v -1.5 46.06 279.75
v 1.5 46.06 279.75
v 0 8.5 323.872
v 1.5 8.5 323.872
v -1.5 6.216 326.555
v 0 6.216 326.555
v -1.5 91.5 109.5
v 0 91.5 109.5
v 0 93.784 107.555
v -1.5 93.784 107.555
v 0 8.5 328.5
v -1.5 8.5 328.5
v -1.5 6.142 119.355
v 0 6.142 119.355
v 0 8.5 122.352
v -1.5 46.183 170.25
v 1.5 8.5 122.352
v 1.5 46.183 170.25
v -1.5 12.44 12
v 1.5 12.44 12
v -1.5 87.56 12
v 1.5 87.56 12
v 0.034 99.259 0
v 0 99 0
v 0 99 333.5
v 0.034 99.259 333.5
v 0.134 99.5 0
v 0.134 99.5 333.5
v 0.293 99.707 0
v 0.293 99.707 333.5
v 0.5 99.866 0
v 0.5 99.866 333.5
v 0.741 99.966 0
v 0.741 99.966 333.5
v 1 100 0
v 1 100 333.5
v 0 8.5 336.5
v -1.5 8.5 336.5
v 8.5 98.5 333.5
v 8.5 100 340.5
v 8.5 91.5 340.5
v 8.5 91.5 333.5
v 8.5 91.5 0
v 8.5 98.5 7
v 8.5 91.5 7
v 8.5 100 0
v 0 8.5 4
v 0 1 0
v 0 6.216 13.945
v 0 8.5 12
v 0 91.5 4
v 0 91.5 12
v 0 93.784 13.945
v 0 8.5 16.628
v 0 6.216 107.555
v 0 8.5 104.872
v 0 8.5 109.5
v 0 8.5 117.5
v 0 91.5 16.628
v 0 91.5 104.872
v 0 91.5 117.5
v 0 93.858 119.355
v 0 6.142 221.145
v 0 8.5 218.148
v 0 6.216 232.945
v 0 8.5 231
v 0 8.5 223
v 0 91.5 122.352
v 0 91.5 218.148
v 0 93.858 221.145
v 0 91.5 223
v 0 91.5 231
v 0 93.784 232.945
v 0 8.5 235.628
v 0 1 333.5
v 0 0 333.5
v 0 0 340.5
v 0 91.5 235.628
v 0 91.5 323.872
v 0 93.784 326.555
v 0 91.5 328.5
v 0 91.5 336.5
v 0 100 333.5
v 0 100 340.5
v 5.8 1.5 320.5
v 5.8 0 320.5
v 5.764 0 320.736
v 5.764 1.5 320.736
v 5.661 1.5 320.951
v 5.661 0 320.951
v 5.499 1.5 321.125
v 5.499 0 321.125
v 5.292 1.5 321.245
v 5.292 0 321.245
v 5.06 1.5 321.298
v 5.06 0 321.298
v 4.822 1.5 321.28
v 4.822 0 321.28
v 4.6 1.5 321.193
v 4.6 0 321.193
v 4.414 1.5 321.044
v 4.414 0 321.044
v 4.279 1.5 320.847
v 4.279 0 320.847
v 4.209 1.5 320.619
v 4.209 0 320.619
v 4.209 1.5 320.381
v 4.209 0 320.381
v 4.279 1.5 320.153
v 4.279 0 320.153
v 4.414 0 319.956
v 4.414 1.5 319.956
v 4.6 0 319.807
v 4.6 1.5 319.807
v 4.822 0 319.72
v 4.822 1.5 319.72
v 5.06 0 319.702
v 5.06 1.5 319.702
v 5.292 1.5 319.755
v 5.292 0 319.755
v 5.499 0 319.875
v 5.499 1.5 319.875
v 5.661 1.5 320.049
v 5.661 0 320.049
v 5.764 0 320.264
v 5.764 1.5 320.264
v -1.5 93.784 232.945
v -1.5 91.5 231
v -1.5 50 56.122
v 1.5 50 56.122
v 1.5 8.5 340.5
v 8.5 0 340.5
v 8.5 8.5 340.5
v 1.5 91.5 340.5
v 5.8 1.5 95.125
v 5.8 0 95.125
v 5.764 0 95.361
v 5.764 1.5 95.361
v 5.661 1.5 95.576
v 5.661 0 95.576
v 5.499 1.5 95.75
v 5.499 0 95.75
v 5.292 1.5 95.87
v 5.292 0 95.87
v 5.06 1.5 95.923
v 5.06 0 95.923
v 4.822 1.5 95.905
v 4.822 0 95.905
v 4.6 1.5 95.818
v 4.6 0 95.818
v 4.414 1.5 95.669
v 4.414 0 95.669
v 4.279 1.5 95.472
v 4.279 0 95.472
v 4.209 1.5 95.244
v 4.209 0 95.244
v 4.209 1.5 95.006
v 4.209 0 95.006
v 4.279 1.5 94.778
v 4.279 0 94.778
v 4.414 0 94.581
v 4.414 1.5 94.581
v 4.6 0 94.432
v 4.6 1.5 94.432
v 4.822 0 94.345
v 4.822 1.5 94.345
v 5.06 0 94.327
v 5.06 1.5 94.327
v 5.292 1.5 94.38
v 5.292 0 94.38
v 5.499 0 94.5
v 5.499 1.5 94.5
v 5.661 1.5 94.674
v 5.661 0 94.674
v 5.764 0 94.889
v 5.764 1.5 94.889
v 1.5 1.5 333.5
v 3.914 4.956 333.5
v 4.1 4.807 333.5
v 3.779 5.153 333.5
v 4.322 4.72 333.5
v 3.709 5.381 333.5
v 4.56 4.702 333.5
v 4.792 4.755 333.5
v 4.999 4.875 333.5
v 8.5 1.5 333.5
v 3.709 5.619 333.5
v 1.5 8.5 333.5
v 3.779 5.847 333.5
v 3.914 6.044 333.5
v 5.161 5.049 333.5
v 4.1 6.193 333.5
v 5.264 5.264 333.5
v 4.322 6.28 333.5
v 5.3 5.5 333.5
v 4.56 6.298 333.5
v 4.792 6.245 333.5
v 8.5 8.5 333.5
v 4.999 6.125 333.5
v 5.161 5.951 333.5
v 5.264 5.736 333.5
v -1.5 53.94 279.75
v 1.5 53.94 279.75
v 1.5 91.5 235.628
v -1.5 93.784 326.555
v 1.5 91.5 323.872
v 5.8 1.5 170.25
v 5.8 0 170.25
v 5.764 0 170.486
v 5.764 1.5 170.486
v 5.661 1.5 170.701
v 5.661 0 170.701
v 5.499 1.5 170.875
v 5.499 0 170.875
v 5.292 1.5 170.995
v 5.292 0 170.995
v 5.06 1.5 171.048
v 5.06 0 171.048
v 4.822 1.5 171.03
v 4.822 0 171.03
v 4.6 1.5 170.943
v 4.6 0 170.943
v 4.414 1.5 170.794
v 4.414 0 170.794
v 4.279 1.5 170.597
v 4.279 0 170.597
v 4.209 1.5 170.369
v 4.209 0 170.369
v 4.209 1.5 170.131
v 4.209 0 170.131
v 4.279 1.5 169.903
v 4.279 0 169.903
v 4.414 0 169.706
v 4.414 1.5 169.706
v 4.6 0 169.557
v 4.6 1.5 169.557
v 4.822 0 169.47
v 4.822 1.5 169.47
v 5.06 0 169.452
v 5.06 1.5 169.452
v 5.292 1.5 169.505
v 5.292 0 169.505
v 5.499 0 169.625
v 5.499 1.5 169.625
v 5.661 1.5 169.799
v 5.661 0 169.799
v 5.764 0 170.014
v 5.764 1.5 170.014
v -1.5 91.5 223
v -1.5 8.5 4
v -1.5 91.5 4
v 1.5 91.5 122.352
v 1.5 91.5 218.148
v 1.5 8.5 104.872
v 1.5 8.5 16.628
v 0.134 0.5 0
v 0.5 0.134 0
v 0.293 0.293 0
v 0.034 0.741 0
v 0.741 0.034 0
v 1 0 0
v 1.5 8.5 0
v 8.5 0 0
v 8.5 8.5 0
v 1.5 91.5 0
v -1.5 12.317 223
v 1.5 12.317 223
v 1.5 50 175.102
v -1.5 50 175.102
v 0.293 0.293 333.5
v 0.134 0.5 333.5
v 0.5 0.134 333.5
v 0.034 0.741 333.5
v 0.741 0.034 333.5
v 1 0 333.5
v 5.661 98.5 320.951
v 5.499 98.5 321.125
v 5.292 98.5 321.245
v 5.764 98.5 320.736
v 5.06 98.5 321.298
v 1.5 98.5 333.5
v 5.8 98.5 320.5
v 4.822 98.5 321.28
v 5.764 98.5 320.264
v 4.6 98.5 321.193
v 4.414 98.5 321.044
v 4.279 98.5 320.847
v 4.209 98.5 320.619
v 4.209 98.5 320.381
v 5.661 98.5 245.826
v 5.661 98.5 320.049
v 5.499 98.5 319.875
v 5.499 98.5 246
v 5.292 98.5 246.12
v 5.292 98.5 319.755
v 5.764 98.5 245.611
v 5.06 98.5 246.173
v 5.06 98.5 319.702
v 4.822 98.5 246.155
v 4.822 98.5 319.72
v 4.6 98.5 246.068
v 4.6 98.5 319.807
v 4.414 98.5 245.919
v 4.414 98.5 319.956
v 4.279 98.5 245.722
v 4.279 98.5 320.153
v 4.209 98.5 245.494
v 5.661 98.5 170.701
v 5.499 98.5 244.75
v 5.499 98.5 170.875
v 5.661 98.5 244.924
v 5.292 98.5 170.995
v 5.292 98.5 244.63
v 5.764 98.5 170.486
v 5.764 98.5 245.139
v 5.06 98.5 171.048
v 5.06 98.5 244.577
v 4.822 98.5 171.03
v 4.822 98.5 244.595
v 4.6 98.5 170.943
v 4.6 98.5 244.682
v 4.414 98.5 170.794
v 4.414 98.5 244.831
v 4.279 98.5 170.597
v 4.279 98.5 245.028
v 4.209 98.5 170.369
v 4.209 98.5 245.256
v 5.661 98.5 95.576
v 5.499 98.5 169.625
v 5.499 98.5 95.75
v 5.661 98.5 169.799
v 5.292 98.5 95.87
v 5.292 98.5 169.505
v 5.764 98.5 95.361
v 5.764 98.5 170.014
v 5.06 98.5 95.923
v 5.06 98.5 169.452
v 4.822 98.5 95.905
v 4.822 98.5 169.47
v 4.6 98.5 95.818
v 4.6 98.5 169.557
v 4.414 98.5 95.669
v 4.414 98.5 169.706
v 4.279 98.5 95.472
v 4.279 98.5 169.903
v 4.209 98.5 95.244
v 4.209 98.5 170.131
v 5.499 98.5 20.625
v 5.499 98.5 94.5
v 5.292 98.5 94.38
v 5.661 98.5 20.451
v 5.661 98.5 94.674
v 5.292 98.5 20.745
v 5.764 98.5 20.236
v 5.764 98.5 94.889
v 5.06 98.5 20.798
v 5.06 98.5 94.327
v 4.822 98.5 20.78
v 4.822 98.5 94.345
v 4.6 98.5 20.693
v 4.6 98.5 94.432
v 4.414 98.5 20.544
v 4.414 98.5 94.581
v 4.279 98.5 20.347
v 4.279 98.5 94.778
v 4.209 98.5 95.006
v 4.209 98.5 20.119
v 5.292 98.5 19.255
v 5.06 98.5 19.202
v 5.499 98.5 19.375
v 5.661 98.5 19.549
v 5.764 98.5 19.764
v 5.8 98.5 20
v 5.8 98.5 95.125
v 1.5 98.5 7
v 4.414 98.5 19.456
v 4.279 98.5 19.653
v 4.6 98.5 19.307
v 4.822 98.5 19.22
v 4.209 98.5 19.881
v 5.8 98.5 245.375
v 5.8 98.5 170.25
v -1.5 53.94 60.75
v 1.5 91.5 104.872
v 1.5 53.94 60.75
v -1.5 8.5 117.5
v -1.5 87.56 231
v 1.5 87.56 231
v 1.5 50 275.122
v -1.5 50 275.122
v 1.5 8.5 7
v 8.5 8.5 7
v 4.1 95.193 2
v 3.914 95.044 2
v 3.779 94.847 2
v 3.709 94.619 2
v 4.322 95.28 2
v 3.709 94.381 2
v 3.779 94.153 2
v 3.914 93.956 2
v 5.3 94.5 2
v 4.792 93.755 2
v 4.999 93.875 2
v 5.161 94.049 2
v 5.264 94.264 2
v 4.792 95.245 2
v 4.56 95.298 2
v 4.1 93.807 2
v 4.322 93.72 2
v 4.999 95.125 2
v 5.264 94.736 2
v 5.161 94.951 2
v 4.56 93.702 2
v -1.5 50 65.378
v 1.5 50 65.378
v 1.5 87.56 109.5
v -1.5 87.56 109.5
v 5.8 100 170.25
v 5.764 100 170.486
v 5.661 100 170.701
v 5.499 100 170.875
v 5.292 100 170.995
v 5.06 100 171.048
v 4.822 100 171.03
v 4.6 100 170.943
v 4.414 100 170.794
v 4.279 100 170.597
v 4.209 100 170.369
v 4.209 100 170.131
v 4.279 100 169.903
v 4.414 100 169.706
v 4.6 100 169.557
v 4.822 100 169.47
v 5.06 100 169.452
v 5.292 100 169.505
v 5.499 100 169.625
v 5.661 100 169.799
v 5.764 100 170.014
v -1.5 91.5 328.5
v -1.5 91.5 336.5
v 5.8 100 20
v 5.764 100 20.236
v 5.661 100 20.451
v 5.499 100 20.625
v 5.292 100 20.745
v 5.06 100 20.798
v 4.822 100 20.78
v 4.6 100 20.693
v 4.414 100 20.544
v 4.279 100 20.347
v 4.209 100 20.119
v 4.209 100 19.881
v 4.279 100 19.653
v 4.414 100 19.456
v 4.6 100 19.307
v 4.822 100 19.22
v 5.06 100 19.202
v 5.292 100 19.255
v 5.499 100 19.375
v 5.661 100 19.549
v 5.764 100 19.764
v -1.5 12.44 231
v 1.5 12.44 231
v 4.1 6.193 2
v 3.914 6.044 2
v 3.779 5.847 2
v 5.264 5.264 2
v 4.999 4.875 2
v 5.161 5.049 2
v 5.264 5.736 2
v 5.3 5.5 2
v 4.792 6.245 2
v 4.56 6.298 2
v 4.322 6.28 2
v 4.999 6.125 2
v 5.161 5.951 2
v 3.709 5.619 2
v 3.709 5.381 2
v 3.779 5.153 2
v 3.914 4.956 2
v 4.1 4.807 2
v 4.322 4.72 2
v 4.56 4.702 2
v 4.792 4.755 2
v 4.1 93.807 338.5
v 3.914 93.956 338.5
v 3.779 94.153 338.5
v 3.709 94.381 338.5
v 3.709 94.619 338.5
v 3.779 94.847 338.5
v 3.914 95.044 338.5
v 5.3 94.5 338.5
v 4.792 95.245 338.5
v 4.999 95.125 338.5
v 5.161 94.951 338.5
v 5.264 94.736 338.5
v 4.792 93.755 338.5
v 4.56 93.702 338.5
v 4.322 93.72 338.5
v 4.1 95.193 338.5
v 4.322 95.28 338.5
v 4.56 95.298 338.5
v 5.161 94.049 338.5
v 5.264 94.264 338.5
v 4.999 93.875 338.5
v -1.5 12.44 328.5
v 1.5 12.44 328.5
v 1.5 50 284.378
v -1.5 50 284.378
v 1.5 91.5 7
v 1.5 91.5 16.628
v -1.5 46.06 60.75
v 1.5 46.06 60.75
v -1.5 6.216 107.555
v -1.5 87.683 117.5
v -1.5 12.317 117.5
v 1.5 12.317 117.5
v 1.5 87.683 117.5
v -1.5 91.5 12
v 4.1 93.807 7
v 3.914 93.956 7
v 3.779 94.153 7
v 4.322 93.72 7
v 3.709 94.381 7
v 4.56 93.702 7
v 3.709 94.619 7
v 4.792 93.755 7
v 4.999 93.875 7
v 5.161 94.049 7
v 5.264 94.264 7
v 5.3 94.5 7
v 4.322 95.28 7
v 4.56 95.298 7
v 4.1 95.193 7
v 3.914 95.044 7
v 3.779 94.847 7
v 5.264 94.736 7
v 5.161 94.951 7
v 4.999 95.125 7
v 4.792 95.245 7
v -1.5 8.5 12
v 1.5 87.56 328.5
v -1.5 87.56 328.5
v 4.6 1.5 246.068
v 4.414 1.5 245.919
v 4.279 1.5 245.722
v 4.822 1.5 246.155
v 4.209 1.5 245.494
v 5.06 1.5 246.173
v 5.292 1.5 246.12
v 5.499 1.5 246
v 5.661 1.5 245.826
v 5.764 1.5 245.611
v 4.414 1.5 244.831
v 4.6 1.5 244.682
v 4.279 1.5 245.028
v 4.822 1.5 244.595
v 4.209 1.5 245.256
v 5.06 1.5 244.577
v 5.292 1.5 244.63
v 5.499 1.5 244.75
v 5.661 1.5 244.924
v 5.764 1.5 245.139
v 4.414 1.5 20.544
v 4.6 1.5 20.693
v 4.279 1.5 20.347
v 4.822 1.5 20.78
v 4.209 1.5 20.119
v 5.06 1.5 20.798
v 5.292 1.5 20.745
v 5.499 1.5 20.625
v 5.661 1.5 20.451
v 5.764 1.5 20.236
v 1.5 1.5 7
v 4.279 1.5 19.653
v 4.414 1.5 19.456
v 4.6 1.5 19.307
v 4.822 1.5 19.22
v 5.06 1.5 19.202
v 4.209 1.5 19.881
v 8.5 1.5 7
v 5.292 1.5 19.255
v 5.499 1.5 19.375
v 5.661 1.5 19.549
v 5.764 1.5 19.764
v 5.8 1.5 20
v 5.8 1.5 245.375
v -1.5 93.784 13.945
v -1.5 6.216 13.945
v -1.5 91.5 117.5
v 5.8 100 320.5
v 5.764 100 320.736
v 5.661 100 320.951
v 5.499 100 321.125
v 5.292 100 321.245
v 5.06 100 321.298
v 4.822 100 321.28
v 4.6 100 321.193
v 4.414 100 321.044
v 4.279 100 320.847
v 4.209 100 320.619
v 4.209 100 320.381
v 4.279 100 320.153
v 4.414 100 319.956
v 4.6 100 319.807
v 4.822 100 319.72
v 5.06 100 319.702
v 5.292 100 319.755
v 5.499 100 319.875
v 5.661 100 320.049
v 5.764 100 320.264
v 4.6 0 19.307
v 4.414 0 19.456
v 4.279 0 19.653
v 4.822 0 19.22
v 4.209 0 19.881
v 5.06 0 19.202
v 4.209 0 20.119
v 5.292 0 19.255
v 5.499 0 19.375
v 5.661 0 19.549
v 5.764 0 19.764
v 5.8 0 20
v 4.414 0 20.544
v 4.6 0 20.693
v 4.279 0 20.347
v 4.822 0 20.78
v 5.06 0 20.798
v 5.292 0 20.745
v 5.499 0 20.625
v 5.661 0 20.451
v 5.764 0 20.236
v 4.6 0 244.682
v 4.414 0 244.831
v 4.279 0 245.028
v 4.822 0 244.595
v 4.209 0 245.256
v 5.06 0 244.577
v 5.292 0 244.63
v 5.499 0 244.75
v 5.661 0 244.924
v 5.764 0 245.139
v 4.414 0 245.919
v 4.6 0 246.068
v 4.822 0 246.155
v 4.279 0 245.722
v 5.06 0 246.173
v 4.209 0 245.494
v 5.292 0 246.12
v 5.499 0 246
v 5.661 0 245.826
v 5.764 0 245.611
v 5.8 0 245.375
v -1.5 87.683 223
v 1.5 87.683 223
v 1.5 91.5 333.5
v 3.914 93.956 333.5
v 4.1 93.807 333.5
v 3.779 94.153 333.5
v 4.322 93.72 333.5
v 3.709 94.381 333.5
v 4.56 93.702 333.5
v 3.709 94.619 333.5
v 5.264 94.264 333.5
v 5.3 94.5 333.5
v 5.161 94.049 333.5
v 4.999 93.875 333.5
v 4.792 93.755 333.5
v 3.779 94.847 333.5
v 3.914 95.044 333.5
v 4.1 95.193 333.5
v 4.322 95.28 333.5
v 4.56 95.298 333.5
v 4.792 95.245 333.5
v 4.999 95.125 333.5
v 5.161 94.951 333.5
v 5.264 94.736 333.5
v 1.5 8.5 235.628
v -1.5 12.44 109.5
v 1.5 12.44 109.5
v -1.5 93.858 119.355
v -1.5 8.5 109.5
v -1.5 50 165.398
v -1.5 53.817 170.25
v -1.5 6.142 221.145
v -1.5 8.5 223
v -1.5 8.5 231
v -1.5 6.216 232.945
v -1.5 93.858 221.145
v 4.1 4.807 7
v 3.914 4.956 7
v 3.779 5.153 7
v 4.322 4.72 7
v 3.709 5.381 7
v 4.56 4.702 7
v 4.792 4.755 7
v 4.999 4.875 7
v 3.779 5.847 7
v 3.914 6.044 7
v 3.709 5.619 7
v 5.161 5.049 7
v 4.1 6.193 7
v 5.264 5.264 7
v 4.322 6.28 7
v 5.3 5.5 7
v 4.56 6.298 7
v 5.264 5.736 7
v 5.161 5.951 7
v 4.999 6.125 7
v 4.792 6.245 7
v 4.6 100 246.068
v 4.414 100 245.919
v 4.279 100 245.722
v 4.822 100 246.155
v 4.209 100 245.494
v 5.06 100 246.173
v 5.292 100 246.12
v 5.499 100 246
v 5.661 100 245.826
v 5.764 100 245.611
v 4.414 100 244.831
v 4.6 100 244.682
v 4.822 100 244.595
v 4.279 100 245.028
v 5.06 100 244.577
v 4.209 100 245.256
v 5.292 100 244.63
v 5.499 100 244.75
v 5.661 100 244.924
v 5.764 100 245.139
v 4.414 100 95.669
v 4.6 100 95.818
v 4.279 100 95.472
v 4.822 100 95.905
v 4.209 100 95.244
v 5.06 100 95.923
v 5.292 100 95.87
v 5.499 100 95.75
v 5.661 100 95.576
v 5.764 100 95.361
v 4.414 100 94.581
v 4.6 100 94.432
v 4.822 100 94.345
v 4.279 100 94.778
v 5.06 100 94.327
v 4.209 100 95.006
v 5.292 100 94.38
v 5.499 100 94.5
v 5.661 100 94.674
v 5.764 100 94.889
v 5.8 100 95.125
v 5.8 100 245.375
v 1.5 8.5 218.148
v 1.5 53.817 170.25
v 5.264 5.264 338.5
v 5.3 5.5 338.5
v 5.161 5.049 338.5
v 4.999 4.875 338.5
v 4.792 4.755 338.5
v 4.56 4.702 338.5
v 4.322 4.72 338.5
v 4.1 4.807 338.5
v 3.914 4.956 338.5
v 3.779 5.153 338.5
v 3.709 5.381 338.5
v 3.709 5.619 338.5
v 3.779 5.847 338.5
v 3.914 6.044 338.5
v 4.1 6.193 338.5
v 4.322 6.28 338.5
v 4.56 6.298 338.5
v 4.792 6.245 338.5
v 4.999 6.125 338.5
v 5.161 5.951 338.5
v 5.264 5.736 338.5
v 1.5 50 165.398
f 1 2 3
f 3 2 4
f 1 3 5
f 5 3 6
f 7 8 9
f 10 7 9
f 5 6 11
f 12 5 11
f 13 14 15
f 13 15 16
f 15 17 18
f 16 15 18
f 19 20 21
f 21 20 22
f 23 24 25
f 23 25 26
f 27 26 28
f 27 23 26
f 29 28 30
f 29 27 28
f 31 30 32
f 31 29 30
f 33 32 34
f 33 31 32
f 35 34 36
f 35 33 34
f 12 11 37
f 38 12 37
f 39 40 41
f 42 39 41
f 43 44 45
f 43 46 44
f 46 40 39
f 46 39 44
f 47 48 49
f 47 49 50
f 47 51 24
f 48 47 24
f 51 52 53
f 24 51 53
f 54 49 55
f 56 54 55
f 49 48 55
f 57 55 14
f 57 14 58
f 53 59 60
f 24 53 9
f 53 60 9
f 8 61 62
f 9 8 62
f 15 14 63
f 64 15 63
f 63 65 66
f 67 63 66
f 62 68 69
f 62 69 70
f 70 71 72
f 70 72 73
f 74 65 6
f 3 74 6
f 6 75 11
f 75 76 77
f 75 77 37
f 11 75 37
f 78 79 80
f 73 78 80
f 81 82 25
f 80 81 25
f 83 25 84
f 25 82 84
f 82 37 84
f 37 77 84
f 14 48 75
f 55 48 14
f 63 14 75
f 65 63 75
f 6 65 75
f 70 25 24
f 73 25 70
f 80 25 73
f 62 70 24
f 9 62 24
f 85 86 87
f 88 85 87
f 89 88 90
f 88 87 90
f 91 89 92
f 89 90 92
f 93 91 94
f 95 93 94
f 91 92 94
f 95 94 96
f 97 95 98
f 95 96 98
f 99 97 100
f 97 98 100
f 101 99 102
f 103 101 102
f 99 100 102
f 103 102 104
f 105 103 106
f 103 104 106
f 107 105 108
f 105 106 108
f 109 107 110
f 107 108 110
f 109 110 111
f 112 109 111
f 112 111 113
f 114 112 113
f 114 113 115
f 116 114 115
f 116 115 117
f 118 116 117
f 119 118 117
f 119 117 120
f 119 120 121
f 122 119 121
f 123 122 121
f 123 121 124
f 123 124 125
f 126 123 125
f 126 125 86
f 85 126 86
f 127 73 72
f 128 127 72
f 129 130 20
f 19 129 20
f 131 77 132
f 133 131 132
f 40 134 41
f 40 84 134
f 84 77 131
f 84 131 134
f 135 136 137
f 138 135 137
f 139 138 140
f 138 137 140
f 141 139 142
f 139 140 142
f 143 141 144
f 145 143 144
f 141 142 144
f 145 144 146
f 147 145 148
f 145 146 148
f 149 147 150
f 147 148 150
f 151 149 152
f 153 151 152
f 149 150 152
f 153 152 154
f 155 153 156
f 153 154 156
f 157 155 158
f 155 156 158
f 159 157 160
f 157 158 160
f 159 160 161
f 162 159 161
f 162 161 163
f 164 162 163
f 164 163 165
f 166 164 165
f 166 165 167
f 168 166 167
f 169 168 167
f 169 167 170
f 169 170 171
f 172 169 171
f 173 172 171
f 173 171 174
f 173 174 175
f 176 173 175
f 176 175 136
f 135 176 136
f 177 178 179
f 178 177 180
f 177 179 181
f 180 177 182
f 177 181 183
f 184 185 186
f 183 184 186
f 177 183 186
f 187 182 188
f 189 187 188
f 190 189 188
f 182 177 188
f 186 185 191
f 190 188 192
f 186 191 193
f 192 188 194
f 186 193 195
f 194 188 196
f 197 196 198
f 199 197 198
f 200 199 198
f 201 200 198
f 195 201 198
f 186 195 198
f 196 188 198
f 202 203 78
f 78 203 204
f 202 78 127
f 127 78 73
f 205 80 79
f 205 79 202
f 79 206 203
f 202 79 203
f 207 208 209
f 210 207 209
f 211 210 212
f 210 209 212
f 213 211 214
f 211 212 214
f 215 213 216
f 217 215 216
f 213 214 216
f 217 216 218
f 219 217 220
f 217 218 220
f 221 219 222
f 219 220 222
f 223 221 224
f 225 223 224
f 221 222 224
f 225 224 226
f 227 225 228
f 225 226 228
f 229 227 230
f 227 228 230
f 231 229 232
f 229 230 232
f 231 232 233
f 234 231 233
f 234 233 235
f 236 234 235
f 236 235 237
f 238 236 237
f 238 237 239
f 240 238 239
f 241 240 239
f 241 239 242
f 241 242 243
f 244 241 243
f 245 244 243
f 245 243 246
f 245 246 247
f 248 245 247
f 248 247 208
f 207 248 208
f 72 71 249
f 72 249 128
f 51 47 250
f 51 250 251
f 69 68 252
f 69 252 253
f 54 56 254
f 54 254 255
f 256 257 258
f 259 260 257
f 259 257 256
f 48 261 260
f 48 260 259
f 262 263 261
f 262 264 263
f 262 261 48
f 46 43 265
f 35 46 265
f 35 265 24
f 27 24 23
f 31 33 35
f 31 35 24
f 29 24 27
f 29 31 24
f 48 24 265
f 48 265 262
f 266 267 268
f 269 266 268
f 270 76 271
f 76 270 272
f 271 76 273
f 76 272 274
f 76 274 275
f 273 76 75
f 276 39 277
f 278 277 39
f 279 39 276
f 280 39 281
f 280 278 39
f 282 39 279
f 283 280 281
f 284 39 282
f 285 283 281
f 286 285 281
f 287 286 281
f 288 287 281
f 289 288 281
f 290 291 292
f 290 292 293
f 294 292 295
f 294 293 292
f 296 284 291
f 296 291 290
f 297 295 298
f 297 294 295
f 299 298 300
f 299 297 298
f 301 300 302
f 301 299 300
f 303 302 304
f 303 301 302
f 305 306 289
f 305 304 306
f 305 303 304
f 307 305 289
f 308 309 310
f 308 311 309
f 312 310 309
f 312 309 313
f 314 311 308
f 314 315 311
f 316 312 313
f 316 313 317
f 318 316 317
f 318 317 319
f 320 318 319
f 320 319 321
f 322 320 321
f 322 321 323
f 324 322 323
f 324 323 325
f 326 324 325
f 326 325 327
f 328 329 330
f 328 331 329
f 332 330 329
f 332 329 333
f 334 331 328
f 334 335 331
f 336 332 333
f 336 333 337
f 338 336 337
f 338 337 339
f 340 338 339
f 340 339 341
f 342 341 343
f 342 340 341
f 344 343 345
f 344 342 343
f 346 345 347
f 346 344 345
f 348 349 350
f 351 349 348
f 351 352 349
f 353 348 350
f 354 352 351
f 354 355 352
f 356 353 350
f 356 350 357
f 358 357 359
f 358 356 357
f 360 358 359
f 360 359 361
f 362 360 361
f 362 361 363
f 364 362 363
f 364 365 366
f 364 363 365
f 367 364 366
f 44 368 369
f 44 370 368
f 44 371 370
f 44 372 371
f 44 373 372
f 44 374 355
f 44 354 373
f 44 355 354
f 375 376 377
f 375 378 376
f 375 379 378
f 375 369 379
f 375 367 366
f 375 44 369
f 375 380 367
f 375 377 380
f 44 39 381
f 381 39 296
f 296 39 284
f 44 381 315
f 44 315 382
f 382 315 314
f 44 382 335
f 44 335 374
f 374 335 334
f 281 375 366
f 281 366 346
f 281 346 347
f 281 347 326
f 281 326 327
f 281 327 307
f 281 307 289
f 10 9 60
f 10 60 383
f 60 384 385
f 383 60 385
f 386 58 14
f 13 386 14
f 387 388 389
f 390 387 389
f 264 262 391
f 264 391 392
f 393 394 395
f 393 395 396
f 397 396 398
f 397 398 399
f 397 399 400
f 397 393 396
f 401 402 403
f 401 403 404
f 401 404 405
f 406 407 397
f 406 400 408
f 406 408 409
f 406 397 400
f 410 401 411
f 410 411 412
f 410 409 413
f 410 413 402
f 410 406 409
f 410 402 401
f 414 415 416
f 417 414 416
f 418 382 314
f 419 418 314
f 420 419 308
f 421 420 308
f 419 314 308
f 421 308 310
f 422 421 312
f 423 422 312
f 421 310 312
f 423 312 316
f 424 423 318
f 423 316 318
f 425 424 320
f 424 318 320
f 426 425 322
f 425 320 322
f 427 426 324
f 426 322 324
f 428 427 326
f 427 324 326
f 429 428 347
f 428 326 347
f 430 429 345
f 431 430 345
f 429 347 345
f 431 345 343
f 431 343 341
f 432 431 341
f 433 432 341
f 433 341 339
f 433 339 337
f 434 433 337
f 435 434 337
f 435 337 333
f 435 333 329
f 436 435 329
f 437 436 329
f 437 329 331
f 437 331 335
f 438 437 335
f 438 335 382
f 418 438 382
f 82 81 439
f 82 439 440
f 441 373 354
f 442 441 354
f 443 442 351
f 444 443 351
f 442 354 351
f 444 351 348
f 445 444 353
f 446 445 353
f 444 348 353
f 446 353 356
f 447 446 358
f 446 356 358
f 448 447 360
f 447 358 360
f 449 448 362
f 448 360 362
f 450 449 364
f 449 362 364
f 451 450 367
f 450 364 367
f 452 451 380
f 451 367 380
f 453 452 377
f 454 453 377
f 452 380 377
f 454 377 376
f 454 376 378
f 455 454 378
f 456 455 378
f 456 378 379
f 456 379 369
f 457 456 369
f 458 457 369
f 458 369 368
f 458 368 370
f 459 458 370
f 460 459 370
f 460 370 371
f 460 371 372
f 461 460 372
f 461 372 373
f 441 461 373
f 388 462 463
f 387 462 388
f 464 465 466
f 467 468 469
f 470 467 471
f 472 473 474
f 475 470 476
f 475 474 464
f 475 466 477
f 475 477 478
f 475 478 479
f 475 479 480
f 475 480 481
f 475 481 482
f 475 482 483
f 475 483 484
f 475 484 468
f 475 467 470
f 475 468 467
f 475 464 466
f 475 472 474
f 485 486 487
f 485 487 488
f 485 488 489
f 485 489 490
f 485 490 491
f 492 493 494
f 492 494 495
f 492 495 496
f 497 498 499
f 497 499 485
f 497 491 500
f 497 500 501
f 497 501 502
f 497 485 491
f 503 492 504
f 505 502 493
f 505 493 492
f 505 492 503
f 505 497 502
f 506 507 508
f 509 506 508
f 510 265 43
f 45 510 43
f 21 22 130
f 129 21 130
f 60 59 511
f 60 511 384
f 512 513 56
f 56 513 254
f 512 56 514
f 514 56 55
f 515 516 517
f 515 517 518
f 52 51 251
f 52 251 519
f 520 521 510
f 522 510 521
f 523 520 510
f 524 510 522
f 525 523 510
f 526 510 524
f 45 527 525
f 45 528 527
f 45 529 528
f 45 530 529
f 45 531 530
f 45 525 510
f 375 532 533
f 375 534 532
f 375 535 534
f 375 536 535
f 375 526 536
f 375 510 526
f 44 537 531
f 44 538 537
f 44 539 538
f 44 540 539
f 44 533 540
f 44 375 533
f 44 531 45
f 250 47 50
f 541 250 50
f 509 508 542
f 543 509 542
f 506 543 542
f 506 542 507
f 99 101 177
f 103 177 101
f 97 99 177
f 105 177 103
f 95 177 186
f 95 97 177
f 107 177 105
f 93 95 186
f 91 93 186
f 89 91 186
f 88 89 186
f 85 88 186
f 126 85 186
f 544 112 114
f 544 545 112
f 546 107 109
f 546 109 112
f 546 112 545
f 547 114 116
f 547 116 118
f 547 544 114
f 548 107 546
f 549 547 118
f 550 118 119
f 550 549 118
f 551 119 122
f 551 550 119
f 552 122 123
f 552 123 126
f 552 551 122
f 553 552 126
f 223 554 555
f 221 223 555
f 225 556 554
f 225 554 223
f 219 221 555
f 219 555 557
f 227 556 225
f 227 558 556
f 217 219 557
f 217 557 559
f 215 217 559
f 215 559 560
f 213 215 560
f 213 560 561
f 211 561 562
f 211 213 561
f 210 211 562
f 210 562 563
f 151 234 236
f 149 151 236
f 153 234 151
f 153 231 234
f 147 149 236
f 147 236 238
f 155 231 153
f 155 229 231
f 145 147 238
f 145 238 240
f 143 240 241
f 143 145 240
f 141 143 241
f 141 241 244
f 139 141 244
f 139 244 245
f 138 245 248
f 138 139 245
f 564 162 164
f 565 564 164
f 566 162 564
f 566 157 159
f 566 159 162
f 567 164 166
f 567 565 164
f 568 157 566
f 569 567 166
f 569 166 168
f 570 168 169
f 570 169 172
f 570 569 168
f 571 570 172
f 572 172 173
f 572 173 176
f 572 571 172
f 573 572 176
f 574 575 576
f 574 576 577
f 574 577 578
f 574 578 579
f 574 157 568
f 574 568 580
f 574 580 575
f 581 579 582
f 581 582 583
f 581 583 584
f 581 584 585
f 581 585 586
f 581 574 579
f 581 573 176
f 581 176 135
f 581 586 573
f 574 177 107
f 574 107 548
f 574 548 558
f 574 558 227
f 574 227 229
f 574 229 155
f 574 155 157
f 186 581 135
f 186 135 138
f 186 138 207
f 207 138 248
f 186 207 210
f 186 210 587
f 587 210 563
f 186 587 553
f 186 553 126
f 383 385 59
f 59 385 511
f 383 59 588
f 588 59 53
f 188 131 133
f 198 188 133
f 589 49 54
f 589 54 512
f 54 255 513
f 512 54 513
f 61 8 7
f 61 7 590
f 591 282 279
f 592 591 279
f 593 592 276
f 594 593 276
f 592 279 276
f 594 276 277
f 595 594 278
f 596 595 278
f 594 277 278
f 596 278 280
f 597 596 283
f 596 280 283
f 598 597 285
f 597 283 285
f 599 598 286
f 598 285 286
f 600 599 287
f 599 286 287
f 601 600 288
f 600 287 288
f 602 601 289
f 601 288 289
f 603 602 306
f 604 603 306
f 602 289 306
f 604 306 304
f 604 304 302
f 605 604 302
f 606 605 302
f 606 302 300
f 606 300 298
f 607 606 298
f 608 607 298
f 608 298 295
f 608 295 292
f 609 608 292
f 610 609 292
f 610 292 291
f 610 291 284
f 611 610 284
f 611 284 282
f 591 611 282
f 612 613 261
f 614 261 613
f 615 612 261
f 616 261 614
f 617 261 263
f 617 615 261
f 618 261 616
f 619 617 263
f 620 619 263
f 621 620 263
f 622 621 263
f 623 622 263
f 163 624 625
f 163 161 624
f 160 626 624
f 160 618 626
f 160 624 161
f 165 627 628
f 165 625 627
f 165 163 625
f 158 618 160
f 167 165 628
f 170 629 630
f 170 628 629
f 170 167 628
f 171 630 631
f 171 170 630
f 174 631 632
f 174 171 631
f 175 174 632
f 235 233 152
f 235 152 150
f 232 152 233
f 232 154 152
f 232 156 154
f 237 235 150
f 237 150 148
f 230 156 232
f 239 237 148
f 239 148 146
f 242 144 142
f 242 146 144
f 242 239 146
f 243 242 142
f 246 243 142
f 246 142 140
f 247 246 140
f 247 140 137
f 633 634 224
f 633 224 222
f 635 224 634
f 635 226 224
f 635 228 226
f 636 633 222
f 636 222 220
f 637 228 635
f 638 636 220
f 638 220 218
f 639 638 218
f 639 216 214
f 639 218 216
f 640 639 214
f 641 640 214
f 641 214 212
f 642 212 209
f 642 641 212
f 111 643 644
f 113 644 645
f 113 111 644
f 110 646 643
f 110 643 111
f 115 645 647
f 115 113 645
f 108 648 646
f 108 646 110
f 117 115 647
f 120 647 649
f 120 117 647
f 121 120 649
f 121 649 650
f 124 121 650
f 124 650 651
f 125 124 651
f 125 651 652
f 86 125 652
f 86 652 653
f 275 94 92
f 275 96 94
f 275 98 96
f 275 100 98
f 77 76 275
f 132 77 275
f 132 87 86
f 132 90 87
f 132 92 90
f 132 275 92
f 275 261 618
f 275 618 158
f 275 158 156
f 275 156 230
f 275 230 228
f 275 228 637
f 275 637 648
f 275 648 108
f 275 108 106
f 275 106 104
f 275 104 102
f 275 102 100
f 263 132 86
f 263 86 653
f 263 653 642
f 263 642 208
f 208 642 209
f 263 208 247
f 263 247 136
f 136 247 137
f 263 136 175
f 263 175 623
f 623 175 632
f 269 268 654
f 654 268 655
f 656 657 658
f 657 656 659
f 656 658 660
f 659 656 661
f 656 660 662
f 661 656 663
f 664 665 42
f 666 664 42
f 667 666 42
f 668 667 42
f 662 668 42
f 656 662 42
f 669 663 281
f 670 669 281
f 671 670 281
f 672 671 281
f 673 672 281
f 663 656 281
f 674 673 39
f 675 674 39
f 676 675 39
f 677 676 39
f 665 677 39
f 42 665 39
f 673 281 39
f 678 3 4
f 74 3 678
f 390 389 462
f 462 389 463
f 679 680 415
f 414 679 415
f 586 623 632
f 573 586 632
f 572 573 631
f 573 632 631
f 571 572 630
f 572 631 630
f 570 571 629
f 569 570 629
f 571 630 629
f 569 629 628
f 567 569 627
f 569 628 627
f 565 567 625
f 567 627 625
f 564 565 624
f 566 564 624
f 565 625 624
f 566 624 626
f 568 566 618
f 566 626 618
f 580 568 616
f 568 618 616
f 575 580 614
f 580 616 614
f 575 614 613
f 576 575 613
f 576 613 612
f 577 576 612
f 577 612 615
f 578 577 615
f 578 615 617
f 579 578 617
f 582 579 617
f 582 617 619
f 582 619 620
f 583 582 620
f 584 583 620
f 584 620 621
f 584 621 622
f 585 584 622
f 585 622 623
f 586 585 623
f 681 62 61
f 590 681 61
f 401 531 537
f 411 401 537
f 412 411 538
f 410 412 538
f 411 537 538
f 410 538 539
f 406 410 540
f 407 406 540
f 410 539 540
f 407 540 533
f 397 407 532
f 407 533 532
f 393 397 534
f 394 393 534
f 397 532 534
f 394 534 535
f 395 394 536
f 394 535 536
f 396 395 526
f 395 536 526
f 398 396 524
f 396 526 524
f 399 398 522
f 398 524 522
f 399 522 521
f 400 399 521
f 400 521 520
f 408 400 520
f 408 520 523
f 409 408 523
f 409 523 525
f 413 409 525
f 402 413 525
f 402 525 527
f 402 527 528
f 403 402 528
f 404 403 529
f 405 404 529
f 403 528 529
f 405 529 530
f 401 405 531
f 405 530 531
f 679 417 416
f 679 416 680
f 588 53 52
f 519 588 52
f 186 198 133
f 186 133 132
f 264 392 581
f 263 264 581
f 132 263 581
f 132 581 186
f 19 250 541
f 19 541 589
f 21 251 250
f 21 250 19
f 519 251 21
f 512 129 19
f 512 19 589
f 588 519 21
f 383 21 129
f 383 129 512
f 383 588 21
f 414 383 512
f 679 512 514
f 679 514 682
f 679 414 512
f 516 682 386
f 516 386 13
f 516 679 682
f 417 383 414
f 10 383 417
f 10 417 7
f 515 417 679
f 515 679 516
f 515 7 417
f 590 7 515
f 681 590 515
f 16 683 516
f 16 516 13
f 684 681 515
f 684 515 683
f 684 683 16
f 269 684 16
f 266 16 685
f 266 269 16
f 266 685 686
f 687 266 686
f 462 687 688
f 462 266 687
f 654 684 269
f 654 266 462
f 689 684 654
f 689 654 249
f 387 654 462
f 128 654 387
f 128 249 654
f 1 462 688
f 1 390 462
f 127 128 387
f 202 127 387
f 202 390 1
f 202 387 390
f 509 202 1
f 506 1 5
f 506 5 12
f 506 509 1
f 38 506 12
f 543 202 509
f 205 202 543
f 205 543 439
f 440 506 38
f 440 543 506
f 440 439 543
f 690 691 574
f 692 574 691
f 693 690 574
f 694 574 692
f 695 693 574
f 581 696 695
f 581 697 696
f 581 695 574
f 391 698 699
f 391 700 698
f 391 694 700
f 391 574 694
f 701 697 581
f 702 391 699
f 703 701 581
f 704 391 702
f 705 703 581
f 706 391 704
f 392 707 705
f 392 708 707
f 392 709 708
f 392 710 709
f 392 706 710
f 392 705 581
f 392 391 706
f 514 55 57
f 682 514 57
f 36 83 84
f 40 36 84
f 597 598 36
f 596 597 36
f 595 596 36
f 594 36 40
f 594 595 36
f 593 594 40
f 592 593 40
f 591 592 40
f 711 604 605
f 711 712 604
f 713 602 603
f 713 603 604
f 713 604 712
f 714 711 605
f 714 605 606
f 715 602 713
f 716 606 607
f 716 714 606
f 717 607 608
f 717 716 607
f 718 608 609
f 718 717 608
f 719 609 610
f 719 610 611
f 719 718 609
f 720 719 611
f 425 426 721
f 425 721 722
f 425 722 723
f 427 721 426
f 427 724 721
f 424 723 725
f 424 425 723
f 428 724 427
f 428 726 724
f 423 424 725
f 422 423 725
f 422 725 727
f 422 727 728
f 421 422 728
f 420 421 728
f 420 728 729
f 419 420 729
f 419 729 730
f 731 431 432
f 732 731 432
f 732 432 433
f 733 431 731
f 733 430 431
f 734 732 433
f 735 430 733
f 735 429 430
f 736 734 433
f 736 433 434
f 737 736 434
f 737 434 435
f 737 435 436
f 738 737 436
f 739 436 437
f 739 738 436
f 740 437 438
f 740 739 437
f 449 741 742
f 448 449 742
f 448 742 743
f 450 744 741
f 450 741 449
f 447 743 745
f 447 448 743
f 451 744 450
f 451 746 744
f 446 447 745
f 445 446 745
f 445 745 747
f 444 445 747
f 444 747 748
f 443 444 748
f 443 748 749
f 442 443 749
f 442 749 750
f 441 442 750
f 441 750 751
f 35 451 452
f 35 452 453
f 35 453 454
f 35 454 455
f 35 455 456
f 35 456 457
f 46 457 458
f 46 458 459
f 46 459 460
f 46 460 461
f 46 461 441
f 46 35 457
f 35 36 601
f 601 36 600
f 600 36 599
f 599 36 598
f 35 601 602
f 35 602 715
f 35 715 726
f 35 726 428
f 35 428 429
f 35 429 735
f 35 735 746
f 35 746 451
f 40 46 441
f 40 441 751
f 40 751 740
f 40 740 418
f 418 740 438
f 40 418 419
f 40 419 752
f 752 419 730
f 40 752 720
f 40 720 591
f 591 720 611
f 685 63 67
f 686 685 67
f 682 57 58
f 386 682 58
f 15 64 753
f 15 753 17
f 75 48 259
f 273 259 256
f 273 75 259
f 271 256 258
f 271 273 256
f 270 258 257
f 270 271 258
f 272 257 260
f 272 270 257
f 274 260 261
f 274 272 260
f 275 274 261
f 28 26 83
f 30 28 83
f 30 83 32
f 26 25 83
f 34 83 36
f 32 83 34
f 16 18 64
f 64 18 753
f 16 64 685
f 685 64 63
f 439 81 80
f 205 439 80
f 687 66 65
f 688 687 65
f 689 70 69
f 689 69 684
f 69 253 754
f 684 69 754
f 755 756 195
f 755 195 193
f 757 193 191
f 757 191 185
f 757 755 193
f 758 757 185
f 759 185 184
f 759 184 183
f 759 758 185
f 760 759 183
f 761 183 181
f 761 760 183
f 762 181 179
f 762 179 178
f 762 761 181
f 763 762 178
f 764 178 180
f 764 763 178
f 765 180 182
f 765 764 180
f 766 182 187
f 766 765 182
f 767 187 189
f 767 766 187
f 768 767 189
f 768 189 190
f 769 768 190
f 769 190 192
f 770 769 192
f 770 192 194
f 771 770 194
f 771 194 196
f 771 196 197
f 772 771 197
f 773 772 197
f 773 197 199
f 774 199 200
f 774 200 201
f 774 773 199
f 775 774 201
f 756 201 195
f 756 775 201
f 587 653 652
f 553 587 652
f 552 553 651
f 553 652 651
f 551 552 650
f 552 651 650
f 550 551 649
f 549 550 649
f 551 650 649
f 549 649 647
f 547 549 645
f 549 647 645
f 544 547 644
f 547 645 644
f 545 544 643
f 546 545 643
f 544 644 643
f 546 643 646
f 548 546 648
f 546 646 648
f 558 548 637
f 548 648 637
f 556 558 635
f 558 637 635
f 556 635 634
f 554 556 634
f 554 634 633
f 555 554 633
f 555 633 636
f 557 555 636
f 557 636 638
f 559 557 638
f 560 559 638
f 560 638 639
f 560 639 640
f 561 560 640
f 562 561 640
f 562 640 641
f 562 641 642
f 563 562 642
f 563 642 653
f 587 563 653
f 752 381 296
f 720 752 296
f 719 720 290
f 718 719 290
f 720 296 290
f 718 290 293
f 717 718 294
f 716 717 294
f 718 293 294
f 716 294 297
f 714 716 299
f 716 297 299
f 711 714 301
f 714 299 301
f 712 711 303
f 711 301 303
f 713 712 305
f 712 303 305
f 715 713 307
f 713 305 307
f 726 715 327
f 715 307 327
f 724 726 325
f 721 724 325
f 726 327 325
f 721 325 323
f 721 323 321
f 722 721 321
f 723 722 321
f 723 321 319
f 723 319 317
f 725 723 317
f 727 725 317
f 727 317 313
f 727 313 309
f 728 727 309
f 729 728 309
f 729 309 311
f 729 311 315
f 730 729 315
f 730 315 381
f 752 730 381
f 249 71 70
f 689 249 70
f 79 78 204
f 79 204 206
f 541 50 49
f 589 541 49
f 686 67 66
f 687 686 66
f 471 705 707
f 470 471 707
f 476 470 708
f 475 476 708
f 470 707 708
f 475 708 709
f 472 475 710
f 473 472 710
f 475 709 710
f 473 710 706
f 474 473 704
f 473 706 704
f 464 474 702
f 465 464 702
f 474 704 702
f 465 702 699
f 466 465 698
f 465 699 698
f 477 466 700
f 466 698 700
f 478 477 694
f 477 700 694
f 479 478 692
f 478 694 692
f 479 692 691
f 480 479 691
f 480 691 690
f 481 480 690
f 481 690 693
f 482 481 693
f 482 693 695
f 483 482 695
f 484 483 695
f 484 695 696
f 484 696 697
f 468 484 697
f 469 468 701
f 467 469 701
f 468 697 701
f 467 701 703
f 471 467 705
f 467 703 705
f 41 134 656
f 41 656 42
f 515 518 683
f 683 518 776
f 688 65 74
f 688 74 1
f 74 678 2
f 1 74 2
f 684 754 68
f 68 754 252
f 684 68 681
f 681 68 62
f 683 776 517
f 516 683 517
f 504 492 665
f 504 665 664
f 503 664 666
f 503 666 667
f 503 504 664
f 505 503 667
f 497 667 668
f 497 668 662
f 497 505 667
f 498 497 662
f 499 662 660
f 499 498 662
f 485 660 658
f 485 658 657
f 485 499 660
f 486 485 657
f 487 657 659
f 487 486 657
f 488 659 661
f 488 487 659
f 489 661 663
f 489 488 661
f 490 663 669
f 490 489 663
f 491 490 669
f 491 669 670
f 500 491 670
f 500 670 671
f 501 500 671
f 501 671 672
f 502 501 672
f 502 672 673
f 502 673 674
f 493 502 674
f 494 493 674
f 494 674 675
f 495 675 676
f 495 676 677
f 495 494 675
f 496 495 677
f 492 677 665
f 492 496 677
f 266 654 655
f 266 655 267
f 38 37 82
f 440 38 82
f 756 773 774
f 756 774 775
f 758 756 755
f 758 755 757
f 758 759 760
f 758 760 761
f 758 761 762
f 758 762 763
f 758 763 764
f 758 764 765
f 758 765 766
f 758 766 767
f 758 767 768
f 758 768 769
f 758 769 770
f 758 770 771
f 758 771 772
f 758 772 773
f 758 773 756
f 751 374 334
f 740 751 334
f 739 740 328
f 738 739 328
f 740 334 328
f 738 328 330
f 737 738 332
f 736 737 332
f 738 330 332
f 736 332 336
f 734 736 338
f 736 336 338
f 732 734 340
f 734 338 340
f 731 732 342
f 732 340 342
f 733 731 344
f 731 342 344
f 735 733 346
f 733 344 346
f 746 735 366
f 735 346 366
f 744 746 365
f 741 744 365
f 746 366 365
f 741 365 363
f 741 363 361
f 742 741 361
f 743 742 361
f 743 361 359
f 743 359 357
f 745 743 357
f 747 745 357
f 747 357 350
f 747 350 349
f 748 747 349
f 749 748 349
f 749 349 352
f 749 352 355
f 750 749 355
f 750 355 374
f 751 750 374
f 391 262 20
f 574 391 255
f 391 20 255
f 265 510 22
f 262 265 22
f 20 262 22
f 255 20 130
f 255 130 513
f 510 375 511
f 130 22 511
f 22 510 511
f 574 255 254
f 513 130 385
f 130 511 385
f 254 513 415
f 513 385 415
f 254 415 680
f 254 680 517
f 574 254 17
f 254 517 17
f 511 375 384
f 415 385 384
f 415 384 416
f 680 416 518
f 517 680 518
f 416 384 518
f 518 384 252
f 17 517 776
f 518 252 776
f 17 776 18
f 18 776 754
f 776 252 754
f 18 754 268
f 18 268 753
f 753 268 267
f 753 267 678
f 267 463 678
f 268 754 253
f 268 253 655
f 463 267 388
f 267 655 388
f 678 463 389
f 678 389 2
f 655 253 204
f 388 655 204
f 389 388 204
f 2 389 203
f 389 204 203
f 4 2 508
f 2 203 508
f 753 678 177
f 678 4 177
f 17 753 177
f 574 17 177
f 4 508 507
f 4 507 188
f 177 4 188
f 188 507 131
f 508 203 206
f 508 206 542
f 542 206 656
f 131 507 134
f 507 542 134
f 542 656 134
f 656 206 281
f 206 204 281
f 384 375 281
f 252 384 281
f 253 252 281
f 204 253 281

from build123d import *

# Parameters (mm, degrees)
PROFILE_DEPTH                               = 340.5
SKETCH2_W                                   = 8.5
SKETCH2_H                                   = 8.5
FEET_DEPTH                                  = 7
POCKETS_DEPTH                               = 355.98239393
RAIL_EDGE_R1_R                              = 1
M2_TAP_HOLES_SKETCH_R                       = 0.8
M2_TAP_HOLES_1_6_DRILL_DEPTH                = 355.98239393
FOOT_TAPS_SKETCH_Z0_END_R                   = 0.8
M2_FOOT_TAPS_1_6_DRILL_5_DEEP_Z0_END_DEPTH  = 5
M2_START                                    = -5
FOOT_TAPS_SKETCH_Z340_END_R                 = 0.8
M2_FOOT_TAPS_1_6_DRILL_5_DEEP_Z340_EN_DEPTH = 5
BRACES_DEPTH                                = 1.5
BRACES_2_DEPTH                              = 1.5
BRACES_OUTER_DEPTH                          = 1.5
BRACES_OUTER_2_DEPTH                        = 1.5
PANEL_PADS_SKETCH_W                         = 8
PANEL_PADS_SKETCH_H                         = 83
PANEL_PADS_DEPTH                            = 1.5


with BuildPart() as part:
    # Sketch1 → Profile (new body)
    with BuildSketch(Plane.XY):
        Polygon((0, 0), (0, 100), (8.5, 100), (8.5, 98.5), (1.5, 98.5), (1.5, 1.5), (8.5, 1.5), (8.5, 0), align=None)
    extrude(amount=PROFILE_DEPTH)

    # Sketch2 → Feet (add)
    with BuildSketch(Plane.XY):
        with Locations((4.25, 4.25)):
            Rectangle(SKETCH2_W, SKETCH2_H)
        with Locations((4.25, 95.75)):
            Rectangle(SKETCH2_W, SKETCH2_H)
    feet = extrude(amount=FEET_DEPTH)

    # Sketch5 → Pockets (cut, through all)
    with BuildSketch(Plane(origin=(0, 0, 0), x_dir=(0, 0, -1), z_dir=(1, 0, 0))):
        with BuildLine():
            Line((-15, 91.5), (-106.5, 91.5))
            ThreePointArc((-106.5, 91.5), (-108.621320344, 90.621320344), (-109.5, 88.5))
            Line((-109.5, 88.5), (-109.5, 11.5))
            ThreePointArc((-109.5, 11.5), (-108.621320344, 9.378679656), (-106.5, 8.5))
            Line((-106.5, 8.5), (-15, 8.5))
            ThreePointArc((-15, 8.5), (-12.878679656, 9.378679656), (-12, 11.5))
            Line((-12, 11.5), (-12, 88.5))
            ThreePointArc((-12, 88.5), (-12.878679656, 90.621320344), (-15, 91.5))
        make_face()
        with BuildLine():
            Line((-120.5, 91.5), (-220, 91.5))
            ThreePointArc((-220, 91.5), (-222.121320344, 90.621320344), (-223, 88.5))
            Line((-223, 88.5), (-223, 11.5))
            ThreePointArc((-223, 11.5), (-222.121320344, 9.378679656), (-220, 8.5))
            Line((-220, 8.5), (-120.5, 8.5))
            ThreePointArc((-120.5, 8.5), (-118.378679656, 9.378679656), (-117.5, 11.5))
            Line((-117.5, 11.5), (-117.5, 88.5))
            ThreePointArc((-117.5, 88.5), (-118.378679656, 90.621320344), (-120.5, 91.5))
        make_face()
        with BuildLine():
            Line((-234, 91.5), (-325.5, 91.5))
            ThreePointArc((-325.5, 91.5), (-327.621320344, 90.621320344), (-328.5, 88.5))
            Line((-328.5, 88.5), (-328.5, 11.5))
            ThreePointArc((-328.5, 11.5), (-327.621320344, 9.378679656), (-325.5, 8.5))
            Line((-325.5, 8.5), (-234, 8.5))
            ThreePointArc((-234, 8.5), (-231.878679656, 9.378679656), (-231, 11.5))
            Line((-231, 11.5), (-231, 88.5))
            ThreePointArc((-231, 88.5), (-231.878679656, 90.621320344), (-234, 91.5))
        make_face()
    extrude(amount=POCKETS_DEPTH, mode=Mode.SUBTRACT)

    # Rail Edge R1
    rail_edge_r1_edges = [part.edges().sort_by_distance(p)[0] for p in [
        (0, 0, 170.25),
        (0, 100, 170.25),
    ]]
    fillet(rail_edge_r1_edges, radius=RAIL_EDGE_R1_R)

    # Feet Mirror: Feet across plane
    add(feet.mirror(Plane.XY.offset(170.25)))

    # M2 tap holes sketch → M2 Tap Holes (1.6 drill) (cut, through all)
    with BuildSketch(Plane.XZ):
        with Locations((5, 20)):
            Circle(M2_TAP_HOLES_SKETCH_R)
        with Locations((5, 95.125)):
            Circle(M2_TAP_HOLES_SKETCH_R)
        with Locations((5, 170.25)):
            Circle(M2_TAP_HOLES_SKETCH_R)
        with Locations((5, 245.375)):
            Circle(M2_TAP_HOLES_SKETCH_R)
        with Locations((5, 320.5)):
            Circle(M2_TAP_HOLES_SKETCH_R)
    extrude(amount=-M2_TAP_HOLES_1_6_DRILL_DEPTH, mode=Mode.SUBTRACT)

    # Foot taps sketch z0 end → M2 Foot Taps (1.6 drill, 5 deep) z0 end (cut)
    with BuildSketch(Plane.XY.offset(7)):
        with Locations((4.5, 5.5)):
            Circle(FOOT_TAPS_SKETCH_Z0_END_R)
        with Locations((4.5, 94.5)):
            Circle(FOOT_TAPS_SKETCH_Z0_END_R)
    extrude(amount=-M2_FOOT_TAPS_1_6_DRILL_5_DEEP_Z0_END_DEPTH, mode=Mode.SUBTRACT)

    # Foot taps sketch z340 end → M2 Foot Taps (1.6 drill, 5 deep) z340 end (cut)
    with BuildSketch(Plane(origin=(0, 0, 333.5), x_dir=(-1, 0, 0), z_dir=(0, 0, -1)).offset(M2_START)):
        with Locations(Location((-4.5, 5.5, 0), (0, 0, 180))):
            Circle(FOOT_TAPS_SKETCH_Z340_END_R)
        with Locations(Location((-4.5, 94.5, 0), (0, 0, 180))):
            Circle(FOOT_TAPS_SKETCH_Z340_END_R)
    extrude(amount=M2_FOOT_TAPS_1_6_DRILL_5_DEEP_Z340_EN_DEPTH, mode=Mode.SUBTRACT)

    # Braces _ sketch → Braces (add)
    with BuildSketch(Plane.ZY):
        Polygon((13.944644974, 6.215627892), (111.444644974, 89.215627892), (107.555355026, 93.784372108), (10.055355026, 10.784372108), align=None)
        Polygon((119.354944806, 6.14220871), (224.854944806, 89.14220871), (221.145055194, 93.85779129), (115.645055194, 10.85779129), align=None)
        Polygon((232.944644974, 6.215627892), (330.444644974, 89.215627892), (326.555355026, 93.784372108), (229.055355026, 10.784372108), align=None)
    extrude(amount=-BRACES_DEPTH)

    # Braces _ sketch 2 → Braces 2 (add)
    with BuildSketch(Plane.ZY):
        Polygon((10.055355026, 89.215627892), (107.555355026, 6.215627892), (111.444644974, 10.784372108), (13.944644974, 93.784372108), align=None)
        Polygon((115.645055194, 89.14220871), (221.145055194, 6.14220871), (224.854944806, 10.85779129), (119.354944806, 93.85779129), align=None)
        Polygon((229.055355026, 89.215627892), (326.555355026, 6.215627892), (330.444644974, 10.784372108), (232.944644974, 93.784372108), align=None)
    extrude(amount=-BRACES_2_DEPTH)

    # Braces _ outer sketch → Braces _ outer (add)
    with BuildSketch(Plane.ZY):
        Polygon((13.944644974, 6.215627892), (111.444644974, 89.215627892), (107.555355026, 93.784372108), (10.055355026, 10.784372108), align=None)
        Polygon((119.354944806, 6.14220871), (224.854944806, 89.14220871), (221.145055194, 93.85779129), (115.645055194, 10.85779129), align=None)
        Polygon((232.944644974, 6.215627892), (330.444644974, 89.215627892), (326.555355026, 93.784372108), (229.055355026, 10.784372108), align=None)
    extrude(amount=BRACES_OUTER_DEPTH)

    # Braces _ outer sketch 2 → Braces _ outer 2 (add)
    with BuildSketch(Plane.ZY):
        Polygon((10.055355026, 89.215627892), (107.555355026, 6.215627892), (111.444644974, 10.784372108), (13.944644974, 93.784372108), align=None)
        Polygon((115.645055194, 89.14220871), (221.145055194, 6.14220871), (224.854944806, 10.85779129), (119.354944806, 93.85779129), align=None)
        Polygon((229.055355026, 89.215627892), (326.555355026, 6.215627892), (330.444644974, 10.784372108), (232.944644974, 93.784372108), align=None)
    extrude(amount=BRACES_OUTER_2_DEPTH)

    # Panel pads sketch → Panel pads (add)
    with BuildSketch(Plane.ZY):
        with Locations((8, 50)):
            Rectangle(PANEL_PADS_SKETCH_W, PANEL_PADS_SKETCH_H)
        with Locations((113.5, 50)):
            Rectangle(PANEL_PADS_SKETCH_W, PANEL_PADS_SKETCH_H)
        with Locations((227, 50)):
            Rectangle(PANEL_PADS_SKETCH_W, PANEL_PADS_SKETCH_H)
        with Locations((332.5, 50)):
            Rectangle(PANEL_PADS_SKETCH_W, PANEL_PADS_SKETCH_H)
    extrude(amount=PANEL_PADS_DEPTH)


solid = part.part
